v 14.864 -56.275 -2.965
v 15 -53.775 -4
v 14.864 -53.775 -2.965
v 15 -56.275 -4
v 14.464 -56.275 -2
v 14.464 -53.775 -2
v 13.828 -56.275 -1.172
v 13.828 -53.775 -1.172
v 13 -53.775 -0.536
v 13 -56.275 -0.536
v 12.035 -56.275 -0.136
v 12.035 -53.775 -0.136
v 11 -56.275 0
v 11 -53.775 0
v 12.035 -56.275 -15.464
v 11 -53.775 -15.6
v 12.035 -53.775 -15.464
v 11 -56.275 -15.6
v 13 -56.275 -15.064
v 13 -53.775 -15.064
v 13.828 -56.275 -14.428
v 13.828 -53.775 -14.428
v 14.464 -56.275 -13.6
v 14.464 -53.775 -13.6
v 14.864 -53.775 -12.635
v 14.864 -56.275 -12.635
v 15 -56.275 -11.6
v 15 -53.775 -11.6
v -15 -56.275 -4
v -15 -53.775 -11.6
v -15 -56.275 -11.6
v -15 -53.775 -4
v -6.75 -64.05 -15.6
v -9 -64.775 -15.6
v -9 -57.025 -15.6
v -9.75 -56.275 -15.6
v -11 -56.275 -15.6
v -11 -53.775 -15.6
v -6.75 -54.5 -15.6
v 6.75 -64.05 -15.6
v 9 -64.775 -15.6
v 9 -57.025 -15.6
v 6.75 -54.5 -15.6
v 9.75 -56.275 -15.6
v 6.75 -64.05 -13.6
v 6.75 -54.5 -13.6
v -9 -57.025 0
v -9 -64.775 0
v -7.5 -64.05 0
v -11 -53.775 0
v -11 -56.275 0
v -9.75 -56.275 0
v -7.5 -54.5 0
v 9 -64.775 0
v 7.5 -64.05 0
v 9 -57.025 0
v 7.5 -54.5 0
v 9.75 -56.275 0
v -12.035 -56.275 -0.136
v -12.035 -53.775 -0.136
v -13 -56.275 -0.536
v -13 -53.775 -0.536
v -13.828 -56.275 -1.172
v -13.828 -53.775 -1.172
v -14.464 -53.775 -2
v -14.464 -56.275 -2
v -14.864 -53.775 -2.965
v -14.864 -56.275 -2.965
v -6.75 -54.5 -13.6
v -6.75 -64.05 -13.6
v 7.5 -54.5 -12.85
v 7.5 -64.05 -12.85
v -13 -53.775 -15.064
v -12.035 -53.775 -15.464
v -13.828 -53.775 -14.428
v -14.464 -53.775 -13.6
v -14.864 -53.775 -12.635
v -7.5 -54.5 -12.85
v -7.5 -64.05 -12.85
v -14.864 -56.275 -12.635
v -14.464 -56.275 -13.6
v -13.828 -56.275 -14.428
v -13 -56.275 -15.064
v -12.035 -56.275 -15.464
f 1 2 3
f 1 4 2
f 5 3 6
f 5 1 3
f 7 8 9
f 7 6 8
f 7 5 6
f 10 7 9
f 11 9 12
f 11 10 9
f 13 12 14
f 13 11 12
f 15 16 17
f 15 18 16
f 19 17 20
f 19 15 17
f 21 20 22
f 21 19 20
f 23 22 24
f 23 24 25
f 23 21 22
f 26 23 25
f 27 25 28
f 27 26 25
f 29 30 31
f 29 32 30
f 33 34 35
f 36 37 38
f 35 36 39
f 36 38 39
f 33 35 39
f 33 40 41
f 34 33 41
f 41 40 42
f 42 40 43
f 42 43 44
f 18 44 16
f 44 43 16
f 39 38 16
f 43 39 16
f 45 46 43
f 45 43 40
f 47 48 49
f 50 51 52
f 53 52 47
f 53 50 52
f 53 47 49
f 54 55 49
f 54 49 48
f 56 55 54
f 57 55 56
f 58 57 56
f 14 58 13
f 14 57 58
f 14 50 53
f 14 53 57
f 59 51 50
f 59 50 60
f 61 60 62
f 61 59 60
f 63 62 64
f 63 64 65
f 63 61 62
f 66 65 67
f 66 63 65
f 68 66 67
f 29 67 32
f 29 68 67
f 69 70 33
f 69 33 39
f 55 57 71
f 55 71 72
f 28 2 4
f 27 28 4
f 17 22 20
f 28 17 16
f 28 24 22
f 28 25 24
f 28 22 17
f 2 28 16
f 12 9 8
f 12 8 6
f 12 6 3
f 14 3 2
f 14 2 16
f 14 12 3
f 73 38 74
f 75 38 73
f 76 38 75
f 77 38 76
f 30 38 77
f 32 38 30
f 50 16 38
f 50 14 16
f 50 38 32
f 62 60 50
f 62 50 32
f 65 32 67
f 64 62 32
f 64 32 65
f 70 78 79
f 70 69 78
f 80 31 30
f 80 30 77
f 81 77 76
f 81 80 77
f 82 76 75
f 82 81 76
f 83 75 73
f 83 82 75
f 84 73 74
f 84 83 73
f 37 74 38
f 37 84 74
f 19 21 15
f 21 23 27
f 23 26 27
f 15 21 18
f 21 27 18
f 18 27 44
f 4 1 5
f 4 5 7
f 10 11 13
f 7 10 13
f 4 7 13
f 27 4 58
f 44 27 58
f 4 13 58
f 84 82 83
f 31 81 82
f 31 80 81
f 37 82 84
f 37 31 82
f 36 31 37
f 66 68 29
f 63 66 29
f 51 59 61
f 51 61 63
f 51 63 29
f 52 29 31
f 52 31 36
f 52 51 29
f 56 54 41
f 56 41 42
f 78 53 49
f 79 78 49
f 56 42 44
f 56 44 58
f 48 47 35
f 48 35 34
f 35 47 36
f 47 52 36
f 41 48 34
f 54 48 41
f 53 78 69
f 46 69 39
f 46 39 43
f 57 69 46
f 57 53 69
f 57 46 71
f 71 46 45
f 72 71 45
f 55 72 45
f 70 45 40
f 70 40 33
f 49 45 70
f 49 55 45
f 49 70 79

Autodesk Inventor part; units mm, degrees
ref_plane "YZ Plane" through (0, 0, 0) normal (1, 0, 0) x (0, 1, 0)
ref_plane "XZ Plane" through (0, 0, 0) normal (0, 1, 0) x (-1, 0, 0)
ref_plane "XY Plane" through (0, 0, 0) normal (0, 0, 1) x (1, 0, 0)
sketch "Sketch1" plane through (0, 0, 0) normal (0, 0, 1) x (1, 0, 0)
  ellipse E0 centre (0, 0) end of major axis (0, 70) minor radius 61.5 construction
  line L0 (-6.6, -55) -> (6.6, -55) construction
  line L1 (6.6, -55) -> (6.6, -63.55) construction
  line L2 (6.6, -63.55) -> (-6.6, -63.55) construction
  line L3 (-6.6, -63.55) -> (-6.6, -55) construction
  line L4 (0, 0) -> (0, -55) construction
  line L5 (-6.75, -54.5) -> (6.75, -54.5)
  line L6 (6.75, -54.5) -> (6.75, -64.05)
  line L7 (6.75, -64.05) -> (-6.75, -64.05)
  line L8 (-6.75, -64.05) -> (-6.75, -54.5)
  line L9 (9, -53.775) -> (-9, -53.775)
  line L10 (-9, -53.775) -> (-9, -64.775)
  line L11 (-9, -64.775) -> (9, -64.775)
  line L12 (9, -64.775) -> (9, -53.775)
  line L13 (6.75, -59.275) -> (-6.75, -59.275) construction
  line L14 (9, -53.775) -> (15, -53.775)
  line L15 (15, -53.775) -> (15, -56.275)
  line L16 (15, -56.275) -> (9, -56.275)
  line L17 (9, -56.275) -> (9, -53.775)
  line L18 (-9, -53.775) -> (-15, -53.775)
  line L19 (-15, -53.775) -> (-15, -56.275)
  line L20 (-15, -56.275) -> (-9, -56.275)
  dimension "d0" = 8.55
  dimension "d1" = 13.2
  dimension "d2" = 55
  dimension "d3" = 0.5
  dimension "d4" = 0.5
  dimension "d5" = 13.5
  dimension "d6" = 6.75
  dimension "d7" = 18
  dimension "d8" = 9
  dimension "d9" = 11
  dimension "d10" = 5.5
  dimension "d20" = 2.5
  dimension "d21" = 6
extrude "Extrusion1" add sketch "Sketch1" against normal blind 15.6
sketch "Sketch2" plane through (0, 0, 0) normal (0, 0, 1) x (1, 0, 0)
  line L0 (-9, -56.275) -> (-9, -64.775) projected
  line L1 (-9, -64.775) -> (9, -64.775) projected
  line L2 (9, -64.775) -> (9, -56.275) projected
  line L3 (-6.75, -54.5) -> (6.75, -54.5) projected
  line L4 (6.75, -54.5) -> (6.75, -64.05) projected
  line L5 (6.75, -64.05) -> (-6.75, -64.05) projected
  line L6 (-6.75, -64.05) -> (-6.75, -54.5) projected
  line L7 (6.75, -54.5) -> (7.5, -54.5)
  line L8 (7.5, -54.5) -> (7.5, -64.05)
  line L9 (7.5, -64.05) -> (6.75, -64.05)
  line L10 (6.75, -64.05) -> (6.75, -54.5)
  line L11 (-6.75, -54.5) -> (-7.5, -54.5)
  line L12 (-7.5, -54.5) -> (-7.5, -64.05)
  line L13 (-7.5, -64.05) -> (-6.75, -64.05)
  line L14 (-6.75, -64.05) -> (-6.75, -54.5)
  line L15 (6.75, -64.05) -> (-6.75, -64.05) projected
  line L16 (9, -56.275) -> (15, -56.275) projected
  line L17 (15, -56.275) -> (15, -53.775) projected
  line L18 (15, -53.775) -> (-15, -53.775) projected
  line L19 (-15, -53.775) -> (-15, -56.275) projected
  line L20 (-15, -56.275) -> (-9, -56.275) projected
  point P0 (0, 0)
  dimension "d13" = 0.75
  dimension "d14" = 0.75
extrude "Extrusion2" cut sketch "Sketch2" against normal blind 13.6 contours L6 L13 L12 L11 | L7 L8 L9 L4
chamfer "Chamfer1" distance 0.75 angle 45 2 edges at (7.5, -59.275, -13.6) (-7.5, -59.275, -13.6)
fillet "Fillet1" radius 4 4 edges at (15, -55.025, -15.6) (15, -55.025, 0) (-15, -55.025, 0) (-15, -55.025, -15.6)
chamfer "Chamfer2" distance 0.75 angle 45 2 edges at (9, -56.275, -7.8) (-9, -56.275, -7.8)
equation "\"d6\" = 0.5 * d5"
equation "\"d8\" = 0.5 * d7"
equation "\"d10\" = 0.5 * d9"
properties part number "new_power_switch"
